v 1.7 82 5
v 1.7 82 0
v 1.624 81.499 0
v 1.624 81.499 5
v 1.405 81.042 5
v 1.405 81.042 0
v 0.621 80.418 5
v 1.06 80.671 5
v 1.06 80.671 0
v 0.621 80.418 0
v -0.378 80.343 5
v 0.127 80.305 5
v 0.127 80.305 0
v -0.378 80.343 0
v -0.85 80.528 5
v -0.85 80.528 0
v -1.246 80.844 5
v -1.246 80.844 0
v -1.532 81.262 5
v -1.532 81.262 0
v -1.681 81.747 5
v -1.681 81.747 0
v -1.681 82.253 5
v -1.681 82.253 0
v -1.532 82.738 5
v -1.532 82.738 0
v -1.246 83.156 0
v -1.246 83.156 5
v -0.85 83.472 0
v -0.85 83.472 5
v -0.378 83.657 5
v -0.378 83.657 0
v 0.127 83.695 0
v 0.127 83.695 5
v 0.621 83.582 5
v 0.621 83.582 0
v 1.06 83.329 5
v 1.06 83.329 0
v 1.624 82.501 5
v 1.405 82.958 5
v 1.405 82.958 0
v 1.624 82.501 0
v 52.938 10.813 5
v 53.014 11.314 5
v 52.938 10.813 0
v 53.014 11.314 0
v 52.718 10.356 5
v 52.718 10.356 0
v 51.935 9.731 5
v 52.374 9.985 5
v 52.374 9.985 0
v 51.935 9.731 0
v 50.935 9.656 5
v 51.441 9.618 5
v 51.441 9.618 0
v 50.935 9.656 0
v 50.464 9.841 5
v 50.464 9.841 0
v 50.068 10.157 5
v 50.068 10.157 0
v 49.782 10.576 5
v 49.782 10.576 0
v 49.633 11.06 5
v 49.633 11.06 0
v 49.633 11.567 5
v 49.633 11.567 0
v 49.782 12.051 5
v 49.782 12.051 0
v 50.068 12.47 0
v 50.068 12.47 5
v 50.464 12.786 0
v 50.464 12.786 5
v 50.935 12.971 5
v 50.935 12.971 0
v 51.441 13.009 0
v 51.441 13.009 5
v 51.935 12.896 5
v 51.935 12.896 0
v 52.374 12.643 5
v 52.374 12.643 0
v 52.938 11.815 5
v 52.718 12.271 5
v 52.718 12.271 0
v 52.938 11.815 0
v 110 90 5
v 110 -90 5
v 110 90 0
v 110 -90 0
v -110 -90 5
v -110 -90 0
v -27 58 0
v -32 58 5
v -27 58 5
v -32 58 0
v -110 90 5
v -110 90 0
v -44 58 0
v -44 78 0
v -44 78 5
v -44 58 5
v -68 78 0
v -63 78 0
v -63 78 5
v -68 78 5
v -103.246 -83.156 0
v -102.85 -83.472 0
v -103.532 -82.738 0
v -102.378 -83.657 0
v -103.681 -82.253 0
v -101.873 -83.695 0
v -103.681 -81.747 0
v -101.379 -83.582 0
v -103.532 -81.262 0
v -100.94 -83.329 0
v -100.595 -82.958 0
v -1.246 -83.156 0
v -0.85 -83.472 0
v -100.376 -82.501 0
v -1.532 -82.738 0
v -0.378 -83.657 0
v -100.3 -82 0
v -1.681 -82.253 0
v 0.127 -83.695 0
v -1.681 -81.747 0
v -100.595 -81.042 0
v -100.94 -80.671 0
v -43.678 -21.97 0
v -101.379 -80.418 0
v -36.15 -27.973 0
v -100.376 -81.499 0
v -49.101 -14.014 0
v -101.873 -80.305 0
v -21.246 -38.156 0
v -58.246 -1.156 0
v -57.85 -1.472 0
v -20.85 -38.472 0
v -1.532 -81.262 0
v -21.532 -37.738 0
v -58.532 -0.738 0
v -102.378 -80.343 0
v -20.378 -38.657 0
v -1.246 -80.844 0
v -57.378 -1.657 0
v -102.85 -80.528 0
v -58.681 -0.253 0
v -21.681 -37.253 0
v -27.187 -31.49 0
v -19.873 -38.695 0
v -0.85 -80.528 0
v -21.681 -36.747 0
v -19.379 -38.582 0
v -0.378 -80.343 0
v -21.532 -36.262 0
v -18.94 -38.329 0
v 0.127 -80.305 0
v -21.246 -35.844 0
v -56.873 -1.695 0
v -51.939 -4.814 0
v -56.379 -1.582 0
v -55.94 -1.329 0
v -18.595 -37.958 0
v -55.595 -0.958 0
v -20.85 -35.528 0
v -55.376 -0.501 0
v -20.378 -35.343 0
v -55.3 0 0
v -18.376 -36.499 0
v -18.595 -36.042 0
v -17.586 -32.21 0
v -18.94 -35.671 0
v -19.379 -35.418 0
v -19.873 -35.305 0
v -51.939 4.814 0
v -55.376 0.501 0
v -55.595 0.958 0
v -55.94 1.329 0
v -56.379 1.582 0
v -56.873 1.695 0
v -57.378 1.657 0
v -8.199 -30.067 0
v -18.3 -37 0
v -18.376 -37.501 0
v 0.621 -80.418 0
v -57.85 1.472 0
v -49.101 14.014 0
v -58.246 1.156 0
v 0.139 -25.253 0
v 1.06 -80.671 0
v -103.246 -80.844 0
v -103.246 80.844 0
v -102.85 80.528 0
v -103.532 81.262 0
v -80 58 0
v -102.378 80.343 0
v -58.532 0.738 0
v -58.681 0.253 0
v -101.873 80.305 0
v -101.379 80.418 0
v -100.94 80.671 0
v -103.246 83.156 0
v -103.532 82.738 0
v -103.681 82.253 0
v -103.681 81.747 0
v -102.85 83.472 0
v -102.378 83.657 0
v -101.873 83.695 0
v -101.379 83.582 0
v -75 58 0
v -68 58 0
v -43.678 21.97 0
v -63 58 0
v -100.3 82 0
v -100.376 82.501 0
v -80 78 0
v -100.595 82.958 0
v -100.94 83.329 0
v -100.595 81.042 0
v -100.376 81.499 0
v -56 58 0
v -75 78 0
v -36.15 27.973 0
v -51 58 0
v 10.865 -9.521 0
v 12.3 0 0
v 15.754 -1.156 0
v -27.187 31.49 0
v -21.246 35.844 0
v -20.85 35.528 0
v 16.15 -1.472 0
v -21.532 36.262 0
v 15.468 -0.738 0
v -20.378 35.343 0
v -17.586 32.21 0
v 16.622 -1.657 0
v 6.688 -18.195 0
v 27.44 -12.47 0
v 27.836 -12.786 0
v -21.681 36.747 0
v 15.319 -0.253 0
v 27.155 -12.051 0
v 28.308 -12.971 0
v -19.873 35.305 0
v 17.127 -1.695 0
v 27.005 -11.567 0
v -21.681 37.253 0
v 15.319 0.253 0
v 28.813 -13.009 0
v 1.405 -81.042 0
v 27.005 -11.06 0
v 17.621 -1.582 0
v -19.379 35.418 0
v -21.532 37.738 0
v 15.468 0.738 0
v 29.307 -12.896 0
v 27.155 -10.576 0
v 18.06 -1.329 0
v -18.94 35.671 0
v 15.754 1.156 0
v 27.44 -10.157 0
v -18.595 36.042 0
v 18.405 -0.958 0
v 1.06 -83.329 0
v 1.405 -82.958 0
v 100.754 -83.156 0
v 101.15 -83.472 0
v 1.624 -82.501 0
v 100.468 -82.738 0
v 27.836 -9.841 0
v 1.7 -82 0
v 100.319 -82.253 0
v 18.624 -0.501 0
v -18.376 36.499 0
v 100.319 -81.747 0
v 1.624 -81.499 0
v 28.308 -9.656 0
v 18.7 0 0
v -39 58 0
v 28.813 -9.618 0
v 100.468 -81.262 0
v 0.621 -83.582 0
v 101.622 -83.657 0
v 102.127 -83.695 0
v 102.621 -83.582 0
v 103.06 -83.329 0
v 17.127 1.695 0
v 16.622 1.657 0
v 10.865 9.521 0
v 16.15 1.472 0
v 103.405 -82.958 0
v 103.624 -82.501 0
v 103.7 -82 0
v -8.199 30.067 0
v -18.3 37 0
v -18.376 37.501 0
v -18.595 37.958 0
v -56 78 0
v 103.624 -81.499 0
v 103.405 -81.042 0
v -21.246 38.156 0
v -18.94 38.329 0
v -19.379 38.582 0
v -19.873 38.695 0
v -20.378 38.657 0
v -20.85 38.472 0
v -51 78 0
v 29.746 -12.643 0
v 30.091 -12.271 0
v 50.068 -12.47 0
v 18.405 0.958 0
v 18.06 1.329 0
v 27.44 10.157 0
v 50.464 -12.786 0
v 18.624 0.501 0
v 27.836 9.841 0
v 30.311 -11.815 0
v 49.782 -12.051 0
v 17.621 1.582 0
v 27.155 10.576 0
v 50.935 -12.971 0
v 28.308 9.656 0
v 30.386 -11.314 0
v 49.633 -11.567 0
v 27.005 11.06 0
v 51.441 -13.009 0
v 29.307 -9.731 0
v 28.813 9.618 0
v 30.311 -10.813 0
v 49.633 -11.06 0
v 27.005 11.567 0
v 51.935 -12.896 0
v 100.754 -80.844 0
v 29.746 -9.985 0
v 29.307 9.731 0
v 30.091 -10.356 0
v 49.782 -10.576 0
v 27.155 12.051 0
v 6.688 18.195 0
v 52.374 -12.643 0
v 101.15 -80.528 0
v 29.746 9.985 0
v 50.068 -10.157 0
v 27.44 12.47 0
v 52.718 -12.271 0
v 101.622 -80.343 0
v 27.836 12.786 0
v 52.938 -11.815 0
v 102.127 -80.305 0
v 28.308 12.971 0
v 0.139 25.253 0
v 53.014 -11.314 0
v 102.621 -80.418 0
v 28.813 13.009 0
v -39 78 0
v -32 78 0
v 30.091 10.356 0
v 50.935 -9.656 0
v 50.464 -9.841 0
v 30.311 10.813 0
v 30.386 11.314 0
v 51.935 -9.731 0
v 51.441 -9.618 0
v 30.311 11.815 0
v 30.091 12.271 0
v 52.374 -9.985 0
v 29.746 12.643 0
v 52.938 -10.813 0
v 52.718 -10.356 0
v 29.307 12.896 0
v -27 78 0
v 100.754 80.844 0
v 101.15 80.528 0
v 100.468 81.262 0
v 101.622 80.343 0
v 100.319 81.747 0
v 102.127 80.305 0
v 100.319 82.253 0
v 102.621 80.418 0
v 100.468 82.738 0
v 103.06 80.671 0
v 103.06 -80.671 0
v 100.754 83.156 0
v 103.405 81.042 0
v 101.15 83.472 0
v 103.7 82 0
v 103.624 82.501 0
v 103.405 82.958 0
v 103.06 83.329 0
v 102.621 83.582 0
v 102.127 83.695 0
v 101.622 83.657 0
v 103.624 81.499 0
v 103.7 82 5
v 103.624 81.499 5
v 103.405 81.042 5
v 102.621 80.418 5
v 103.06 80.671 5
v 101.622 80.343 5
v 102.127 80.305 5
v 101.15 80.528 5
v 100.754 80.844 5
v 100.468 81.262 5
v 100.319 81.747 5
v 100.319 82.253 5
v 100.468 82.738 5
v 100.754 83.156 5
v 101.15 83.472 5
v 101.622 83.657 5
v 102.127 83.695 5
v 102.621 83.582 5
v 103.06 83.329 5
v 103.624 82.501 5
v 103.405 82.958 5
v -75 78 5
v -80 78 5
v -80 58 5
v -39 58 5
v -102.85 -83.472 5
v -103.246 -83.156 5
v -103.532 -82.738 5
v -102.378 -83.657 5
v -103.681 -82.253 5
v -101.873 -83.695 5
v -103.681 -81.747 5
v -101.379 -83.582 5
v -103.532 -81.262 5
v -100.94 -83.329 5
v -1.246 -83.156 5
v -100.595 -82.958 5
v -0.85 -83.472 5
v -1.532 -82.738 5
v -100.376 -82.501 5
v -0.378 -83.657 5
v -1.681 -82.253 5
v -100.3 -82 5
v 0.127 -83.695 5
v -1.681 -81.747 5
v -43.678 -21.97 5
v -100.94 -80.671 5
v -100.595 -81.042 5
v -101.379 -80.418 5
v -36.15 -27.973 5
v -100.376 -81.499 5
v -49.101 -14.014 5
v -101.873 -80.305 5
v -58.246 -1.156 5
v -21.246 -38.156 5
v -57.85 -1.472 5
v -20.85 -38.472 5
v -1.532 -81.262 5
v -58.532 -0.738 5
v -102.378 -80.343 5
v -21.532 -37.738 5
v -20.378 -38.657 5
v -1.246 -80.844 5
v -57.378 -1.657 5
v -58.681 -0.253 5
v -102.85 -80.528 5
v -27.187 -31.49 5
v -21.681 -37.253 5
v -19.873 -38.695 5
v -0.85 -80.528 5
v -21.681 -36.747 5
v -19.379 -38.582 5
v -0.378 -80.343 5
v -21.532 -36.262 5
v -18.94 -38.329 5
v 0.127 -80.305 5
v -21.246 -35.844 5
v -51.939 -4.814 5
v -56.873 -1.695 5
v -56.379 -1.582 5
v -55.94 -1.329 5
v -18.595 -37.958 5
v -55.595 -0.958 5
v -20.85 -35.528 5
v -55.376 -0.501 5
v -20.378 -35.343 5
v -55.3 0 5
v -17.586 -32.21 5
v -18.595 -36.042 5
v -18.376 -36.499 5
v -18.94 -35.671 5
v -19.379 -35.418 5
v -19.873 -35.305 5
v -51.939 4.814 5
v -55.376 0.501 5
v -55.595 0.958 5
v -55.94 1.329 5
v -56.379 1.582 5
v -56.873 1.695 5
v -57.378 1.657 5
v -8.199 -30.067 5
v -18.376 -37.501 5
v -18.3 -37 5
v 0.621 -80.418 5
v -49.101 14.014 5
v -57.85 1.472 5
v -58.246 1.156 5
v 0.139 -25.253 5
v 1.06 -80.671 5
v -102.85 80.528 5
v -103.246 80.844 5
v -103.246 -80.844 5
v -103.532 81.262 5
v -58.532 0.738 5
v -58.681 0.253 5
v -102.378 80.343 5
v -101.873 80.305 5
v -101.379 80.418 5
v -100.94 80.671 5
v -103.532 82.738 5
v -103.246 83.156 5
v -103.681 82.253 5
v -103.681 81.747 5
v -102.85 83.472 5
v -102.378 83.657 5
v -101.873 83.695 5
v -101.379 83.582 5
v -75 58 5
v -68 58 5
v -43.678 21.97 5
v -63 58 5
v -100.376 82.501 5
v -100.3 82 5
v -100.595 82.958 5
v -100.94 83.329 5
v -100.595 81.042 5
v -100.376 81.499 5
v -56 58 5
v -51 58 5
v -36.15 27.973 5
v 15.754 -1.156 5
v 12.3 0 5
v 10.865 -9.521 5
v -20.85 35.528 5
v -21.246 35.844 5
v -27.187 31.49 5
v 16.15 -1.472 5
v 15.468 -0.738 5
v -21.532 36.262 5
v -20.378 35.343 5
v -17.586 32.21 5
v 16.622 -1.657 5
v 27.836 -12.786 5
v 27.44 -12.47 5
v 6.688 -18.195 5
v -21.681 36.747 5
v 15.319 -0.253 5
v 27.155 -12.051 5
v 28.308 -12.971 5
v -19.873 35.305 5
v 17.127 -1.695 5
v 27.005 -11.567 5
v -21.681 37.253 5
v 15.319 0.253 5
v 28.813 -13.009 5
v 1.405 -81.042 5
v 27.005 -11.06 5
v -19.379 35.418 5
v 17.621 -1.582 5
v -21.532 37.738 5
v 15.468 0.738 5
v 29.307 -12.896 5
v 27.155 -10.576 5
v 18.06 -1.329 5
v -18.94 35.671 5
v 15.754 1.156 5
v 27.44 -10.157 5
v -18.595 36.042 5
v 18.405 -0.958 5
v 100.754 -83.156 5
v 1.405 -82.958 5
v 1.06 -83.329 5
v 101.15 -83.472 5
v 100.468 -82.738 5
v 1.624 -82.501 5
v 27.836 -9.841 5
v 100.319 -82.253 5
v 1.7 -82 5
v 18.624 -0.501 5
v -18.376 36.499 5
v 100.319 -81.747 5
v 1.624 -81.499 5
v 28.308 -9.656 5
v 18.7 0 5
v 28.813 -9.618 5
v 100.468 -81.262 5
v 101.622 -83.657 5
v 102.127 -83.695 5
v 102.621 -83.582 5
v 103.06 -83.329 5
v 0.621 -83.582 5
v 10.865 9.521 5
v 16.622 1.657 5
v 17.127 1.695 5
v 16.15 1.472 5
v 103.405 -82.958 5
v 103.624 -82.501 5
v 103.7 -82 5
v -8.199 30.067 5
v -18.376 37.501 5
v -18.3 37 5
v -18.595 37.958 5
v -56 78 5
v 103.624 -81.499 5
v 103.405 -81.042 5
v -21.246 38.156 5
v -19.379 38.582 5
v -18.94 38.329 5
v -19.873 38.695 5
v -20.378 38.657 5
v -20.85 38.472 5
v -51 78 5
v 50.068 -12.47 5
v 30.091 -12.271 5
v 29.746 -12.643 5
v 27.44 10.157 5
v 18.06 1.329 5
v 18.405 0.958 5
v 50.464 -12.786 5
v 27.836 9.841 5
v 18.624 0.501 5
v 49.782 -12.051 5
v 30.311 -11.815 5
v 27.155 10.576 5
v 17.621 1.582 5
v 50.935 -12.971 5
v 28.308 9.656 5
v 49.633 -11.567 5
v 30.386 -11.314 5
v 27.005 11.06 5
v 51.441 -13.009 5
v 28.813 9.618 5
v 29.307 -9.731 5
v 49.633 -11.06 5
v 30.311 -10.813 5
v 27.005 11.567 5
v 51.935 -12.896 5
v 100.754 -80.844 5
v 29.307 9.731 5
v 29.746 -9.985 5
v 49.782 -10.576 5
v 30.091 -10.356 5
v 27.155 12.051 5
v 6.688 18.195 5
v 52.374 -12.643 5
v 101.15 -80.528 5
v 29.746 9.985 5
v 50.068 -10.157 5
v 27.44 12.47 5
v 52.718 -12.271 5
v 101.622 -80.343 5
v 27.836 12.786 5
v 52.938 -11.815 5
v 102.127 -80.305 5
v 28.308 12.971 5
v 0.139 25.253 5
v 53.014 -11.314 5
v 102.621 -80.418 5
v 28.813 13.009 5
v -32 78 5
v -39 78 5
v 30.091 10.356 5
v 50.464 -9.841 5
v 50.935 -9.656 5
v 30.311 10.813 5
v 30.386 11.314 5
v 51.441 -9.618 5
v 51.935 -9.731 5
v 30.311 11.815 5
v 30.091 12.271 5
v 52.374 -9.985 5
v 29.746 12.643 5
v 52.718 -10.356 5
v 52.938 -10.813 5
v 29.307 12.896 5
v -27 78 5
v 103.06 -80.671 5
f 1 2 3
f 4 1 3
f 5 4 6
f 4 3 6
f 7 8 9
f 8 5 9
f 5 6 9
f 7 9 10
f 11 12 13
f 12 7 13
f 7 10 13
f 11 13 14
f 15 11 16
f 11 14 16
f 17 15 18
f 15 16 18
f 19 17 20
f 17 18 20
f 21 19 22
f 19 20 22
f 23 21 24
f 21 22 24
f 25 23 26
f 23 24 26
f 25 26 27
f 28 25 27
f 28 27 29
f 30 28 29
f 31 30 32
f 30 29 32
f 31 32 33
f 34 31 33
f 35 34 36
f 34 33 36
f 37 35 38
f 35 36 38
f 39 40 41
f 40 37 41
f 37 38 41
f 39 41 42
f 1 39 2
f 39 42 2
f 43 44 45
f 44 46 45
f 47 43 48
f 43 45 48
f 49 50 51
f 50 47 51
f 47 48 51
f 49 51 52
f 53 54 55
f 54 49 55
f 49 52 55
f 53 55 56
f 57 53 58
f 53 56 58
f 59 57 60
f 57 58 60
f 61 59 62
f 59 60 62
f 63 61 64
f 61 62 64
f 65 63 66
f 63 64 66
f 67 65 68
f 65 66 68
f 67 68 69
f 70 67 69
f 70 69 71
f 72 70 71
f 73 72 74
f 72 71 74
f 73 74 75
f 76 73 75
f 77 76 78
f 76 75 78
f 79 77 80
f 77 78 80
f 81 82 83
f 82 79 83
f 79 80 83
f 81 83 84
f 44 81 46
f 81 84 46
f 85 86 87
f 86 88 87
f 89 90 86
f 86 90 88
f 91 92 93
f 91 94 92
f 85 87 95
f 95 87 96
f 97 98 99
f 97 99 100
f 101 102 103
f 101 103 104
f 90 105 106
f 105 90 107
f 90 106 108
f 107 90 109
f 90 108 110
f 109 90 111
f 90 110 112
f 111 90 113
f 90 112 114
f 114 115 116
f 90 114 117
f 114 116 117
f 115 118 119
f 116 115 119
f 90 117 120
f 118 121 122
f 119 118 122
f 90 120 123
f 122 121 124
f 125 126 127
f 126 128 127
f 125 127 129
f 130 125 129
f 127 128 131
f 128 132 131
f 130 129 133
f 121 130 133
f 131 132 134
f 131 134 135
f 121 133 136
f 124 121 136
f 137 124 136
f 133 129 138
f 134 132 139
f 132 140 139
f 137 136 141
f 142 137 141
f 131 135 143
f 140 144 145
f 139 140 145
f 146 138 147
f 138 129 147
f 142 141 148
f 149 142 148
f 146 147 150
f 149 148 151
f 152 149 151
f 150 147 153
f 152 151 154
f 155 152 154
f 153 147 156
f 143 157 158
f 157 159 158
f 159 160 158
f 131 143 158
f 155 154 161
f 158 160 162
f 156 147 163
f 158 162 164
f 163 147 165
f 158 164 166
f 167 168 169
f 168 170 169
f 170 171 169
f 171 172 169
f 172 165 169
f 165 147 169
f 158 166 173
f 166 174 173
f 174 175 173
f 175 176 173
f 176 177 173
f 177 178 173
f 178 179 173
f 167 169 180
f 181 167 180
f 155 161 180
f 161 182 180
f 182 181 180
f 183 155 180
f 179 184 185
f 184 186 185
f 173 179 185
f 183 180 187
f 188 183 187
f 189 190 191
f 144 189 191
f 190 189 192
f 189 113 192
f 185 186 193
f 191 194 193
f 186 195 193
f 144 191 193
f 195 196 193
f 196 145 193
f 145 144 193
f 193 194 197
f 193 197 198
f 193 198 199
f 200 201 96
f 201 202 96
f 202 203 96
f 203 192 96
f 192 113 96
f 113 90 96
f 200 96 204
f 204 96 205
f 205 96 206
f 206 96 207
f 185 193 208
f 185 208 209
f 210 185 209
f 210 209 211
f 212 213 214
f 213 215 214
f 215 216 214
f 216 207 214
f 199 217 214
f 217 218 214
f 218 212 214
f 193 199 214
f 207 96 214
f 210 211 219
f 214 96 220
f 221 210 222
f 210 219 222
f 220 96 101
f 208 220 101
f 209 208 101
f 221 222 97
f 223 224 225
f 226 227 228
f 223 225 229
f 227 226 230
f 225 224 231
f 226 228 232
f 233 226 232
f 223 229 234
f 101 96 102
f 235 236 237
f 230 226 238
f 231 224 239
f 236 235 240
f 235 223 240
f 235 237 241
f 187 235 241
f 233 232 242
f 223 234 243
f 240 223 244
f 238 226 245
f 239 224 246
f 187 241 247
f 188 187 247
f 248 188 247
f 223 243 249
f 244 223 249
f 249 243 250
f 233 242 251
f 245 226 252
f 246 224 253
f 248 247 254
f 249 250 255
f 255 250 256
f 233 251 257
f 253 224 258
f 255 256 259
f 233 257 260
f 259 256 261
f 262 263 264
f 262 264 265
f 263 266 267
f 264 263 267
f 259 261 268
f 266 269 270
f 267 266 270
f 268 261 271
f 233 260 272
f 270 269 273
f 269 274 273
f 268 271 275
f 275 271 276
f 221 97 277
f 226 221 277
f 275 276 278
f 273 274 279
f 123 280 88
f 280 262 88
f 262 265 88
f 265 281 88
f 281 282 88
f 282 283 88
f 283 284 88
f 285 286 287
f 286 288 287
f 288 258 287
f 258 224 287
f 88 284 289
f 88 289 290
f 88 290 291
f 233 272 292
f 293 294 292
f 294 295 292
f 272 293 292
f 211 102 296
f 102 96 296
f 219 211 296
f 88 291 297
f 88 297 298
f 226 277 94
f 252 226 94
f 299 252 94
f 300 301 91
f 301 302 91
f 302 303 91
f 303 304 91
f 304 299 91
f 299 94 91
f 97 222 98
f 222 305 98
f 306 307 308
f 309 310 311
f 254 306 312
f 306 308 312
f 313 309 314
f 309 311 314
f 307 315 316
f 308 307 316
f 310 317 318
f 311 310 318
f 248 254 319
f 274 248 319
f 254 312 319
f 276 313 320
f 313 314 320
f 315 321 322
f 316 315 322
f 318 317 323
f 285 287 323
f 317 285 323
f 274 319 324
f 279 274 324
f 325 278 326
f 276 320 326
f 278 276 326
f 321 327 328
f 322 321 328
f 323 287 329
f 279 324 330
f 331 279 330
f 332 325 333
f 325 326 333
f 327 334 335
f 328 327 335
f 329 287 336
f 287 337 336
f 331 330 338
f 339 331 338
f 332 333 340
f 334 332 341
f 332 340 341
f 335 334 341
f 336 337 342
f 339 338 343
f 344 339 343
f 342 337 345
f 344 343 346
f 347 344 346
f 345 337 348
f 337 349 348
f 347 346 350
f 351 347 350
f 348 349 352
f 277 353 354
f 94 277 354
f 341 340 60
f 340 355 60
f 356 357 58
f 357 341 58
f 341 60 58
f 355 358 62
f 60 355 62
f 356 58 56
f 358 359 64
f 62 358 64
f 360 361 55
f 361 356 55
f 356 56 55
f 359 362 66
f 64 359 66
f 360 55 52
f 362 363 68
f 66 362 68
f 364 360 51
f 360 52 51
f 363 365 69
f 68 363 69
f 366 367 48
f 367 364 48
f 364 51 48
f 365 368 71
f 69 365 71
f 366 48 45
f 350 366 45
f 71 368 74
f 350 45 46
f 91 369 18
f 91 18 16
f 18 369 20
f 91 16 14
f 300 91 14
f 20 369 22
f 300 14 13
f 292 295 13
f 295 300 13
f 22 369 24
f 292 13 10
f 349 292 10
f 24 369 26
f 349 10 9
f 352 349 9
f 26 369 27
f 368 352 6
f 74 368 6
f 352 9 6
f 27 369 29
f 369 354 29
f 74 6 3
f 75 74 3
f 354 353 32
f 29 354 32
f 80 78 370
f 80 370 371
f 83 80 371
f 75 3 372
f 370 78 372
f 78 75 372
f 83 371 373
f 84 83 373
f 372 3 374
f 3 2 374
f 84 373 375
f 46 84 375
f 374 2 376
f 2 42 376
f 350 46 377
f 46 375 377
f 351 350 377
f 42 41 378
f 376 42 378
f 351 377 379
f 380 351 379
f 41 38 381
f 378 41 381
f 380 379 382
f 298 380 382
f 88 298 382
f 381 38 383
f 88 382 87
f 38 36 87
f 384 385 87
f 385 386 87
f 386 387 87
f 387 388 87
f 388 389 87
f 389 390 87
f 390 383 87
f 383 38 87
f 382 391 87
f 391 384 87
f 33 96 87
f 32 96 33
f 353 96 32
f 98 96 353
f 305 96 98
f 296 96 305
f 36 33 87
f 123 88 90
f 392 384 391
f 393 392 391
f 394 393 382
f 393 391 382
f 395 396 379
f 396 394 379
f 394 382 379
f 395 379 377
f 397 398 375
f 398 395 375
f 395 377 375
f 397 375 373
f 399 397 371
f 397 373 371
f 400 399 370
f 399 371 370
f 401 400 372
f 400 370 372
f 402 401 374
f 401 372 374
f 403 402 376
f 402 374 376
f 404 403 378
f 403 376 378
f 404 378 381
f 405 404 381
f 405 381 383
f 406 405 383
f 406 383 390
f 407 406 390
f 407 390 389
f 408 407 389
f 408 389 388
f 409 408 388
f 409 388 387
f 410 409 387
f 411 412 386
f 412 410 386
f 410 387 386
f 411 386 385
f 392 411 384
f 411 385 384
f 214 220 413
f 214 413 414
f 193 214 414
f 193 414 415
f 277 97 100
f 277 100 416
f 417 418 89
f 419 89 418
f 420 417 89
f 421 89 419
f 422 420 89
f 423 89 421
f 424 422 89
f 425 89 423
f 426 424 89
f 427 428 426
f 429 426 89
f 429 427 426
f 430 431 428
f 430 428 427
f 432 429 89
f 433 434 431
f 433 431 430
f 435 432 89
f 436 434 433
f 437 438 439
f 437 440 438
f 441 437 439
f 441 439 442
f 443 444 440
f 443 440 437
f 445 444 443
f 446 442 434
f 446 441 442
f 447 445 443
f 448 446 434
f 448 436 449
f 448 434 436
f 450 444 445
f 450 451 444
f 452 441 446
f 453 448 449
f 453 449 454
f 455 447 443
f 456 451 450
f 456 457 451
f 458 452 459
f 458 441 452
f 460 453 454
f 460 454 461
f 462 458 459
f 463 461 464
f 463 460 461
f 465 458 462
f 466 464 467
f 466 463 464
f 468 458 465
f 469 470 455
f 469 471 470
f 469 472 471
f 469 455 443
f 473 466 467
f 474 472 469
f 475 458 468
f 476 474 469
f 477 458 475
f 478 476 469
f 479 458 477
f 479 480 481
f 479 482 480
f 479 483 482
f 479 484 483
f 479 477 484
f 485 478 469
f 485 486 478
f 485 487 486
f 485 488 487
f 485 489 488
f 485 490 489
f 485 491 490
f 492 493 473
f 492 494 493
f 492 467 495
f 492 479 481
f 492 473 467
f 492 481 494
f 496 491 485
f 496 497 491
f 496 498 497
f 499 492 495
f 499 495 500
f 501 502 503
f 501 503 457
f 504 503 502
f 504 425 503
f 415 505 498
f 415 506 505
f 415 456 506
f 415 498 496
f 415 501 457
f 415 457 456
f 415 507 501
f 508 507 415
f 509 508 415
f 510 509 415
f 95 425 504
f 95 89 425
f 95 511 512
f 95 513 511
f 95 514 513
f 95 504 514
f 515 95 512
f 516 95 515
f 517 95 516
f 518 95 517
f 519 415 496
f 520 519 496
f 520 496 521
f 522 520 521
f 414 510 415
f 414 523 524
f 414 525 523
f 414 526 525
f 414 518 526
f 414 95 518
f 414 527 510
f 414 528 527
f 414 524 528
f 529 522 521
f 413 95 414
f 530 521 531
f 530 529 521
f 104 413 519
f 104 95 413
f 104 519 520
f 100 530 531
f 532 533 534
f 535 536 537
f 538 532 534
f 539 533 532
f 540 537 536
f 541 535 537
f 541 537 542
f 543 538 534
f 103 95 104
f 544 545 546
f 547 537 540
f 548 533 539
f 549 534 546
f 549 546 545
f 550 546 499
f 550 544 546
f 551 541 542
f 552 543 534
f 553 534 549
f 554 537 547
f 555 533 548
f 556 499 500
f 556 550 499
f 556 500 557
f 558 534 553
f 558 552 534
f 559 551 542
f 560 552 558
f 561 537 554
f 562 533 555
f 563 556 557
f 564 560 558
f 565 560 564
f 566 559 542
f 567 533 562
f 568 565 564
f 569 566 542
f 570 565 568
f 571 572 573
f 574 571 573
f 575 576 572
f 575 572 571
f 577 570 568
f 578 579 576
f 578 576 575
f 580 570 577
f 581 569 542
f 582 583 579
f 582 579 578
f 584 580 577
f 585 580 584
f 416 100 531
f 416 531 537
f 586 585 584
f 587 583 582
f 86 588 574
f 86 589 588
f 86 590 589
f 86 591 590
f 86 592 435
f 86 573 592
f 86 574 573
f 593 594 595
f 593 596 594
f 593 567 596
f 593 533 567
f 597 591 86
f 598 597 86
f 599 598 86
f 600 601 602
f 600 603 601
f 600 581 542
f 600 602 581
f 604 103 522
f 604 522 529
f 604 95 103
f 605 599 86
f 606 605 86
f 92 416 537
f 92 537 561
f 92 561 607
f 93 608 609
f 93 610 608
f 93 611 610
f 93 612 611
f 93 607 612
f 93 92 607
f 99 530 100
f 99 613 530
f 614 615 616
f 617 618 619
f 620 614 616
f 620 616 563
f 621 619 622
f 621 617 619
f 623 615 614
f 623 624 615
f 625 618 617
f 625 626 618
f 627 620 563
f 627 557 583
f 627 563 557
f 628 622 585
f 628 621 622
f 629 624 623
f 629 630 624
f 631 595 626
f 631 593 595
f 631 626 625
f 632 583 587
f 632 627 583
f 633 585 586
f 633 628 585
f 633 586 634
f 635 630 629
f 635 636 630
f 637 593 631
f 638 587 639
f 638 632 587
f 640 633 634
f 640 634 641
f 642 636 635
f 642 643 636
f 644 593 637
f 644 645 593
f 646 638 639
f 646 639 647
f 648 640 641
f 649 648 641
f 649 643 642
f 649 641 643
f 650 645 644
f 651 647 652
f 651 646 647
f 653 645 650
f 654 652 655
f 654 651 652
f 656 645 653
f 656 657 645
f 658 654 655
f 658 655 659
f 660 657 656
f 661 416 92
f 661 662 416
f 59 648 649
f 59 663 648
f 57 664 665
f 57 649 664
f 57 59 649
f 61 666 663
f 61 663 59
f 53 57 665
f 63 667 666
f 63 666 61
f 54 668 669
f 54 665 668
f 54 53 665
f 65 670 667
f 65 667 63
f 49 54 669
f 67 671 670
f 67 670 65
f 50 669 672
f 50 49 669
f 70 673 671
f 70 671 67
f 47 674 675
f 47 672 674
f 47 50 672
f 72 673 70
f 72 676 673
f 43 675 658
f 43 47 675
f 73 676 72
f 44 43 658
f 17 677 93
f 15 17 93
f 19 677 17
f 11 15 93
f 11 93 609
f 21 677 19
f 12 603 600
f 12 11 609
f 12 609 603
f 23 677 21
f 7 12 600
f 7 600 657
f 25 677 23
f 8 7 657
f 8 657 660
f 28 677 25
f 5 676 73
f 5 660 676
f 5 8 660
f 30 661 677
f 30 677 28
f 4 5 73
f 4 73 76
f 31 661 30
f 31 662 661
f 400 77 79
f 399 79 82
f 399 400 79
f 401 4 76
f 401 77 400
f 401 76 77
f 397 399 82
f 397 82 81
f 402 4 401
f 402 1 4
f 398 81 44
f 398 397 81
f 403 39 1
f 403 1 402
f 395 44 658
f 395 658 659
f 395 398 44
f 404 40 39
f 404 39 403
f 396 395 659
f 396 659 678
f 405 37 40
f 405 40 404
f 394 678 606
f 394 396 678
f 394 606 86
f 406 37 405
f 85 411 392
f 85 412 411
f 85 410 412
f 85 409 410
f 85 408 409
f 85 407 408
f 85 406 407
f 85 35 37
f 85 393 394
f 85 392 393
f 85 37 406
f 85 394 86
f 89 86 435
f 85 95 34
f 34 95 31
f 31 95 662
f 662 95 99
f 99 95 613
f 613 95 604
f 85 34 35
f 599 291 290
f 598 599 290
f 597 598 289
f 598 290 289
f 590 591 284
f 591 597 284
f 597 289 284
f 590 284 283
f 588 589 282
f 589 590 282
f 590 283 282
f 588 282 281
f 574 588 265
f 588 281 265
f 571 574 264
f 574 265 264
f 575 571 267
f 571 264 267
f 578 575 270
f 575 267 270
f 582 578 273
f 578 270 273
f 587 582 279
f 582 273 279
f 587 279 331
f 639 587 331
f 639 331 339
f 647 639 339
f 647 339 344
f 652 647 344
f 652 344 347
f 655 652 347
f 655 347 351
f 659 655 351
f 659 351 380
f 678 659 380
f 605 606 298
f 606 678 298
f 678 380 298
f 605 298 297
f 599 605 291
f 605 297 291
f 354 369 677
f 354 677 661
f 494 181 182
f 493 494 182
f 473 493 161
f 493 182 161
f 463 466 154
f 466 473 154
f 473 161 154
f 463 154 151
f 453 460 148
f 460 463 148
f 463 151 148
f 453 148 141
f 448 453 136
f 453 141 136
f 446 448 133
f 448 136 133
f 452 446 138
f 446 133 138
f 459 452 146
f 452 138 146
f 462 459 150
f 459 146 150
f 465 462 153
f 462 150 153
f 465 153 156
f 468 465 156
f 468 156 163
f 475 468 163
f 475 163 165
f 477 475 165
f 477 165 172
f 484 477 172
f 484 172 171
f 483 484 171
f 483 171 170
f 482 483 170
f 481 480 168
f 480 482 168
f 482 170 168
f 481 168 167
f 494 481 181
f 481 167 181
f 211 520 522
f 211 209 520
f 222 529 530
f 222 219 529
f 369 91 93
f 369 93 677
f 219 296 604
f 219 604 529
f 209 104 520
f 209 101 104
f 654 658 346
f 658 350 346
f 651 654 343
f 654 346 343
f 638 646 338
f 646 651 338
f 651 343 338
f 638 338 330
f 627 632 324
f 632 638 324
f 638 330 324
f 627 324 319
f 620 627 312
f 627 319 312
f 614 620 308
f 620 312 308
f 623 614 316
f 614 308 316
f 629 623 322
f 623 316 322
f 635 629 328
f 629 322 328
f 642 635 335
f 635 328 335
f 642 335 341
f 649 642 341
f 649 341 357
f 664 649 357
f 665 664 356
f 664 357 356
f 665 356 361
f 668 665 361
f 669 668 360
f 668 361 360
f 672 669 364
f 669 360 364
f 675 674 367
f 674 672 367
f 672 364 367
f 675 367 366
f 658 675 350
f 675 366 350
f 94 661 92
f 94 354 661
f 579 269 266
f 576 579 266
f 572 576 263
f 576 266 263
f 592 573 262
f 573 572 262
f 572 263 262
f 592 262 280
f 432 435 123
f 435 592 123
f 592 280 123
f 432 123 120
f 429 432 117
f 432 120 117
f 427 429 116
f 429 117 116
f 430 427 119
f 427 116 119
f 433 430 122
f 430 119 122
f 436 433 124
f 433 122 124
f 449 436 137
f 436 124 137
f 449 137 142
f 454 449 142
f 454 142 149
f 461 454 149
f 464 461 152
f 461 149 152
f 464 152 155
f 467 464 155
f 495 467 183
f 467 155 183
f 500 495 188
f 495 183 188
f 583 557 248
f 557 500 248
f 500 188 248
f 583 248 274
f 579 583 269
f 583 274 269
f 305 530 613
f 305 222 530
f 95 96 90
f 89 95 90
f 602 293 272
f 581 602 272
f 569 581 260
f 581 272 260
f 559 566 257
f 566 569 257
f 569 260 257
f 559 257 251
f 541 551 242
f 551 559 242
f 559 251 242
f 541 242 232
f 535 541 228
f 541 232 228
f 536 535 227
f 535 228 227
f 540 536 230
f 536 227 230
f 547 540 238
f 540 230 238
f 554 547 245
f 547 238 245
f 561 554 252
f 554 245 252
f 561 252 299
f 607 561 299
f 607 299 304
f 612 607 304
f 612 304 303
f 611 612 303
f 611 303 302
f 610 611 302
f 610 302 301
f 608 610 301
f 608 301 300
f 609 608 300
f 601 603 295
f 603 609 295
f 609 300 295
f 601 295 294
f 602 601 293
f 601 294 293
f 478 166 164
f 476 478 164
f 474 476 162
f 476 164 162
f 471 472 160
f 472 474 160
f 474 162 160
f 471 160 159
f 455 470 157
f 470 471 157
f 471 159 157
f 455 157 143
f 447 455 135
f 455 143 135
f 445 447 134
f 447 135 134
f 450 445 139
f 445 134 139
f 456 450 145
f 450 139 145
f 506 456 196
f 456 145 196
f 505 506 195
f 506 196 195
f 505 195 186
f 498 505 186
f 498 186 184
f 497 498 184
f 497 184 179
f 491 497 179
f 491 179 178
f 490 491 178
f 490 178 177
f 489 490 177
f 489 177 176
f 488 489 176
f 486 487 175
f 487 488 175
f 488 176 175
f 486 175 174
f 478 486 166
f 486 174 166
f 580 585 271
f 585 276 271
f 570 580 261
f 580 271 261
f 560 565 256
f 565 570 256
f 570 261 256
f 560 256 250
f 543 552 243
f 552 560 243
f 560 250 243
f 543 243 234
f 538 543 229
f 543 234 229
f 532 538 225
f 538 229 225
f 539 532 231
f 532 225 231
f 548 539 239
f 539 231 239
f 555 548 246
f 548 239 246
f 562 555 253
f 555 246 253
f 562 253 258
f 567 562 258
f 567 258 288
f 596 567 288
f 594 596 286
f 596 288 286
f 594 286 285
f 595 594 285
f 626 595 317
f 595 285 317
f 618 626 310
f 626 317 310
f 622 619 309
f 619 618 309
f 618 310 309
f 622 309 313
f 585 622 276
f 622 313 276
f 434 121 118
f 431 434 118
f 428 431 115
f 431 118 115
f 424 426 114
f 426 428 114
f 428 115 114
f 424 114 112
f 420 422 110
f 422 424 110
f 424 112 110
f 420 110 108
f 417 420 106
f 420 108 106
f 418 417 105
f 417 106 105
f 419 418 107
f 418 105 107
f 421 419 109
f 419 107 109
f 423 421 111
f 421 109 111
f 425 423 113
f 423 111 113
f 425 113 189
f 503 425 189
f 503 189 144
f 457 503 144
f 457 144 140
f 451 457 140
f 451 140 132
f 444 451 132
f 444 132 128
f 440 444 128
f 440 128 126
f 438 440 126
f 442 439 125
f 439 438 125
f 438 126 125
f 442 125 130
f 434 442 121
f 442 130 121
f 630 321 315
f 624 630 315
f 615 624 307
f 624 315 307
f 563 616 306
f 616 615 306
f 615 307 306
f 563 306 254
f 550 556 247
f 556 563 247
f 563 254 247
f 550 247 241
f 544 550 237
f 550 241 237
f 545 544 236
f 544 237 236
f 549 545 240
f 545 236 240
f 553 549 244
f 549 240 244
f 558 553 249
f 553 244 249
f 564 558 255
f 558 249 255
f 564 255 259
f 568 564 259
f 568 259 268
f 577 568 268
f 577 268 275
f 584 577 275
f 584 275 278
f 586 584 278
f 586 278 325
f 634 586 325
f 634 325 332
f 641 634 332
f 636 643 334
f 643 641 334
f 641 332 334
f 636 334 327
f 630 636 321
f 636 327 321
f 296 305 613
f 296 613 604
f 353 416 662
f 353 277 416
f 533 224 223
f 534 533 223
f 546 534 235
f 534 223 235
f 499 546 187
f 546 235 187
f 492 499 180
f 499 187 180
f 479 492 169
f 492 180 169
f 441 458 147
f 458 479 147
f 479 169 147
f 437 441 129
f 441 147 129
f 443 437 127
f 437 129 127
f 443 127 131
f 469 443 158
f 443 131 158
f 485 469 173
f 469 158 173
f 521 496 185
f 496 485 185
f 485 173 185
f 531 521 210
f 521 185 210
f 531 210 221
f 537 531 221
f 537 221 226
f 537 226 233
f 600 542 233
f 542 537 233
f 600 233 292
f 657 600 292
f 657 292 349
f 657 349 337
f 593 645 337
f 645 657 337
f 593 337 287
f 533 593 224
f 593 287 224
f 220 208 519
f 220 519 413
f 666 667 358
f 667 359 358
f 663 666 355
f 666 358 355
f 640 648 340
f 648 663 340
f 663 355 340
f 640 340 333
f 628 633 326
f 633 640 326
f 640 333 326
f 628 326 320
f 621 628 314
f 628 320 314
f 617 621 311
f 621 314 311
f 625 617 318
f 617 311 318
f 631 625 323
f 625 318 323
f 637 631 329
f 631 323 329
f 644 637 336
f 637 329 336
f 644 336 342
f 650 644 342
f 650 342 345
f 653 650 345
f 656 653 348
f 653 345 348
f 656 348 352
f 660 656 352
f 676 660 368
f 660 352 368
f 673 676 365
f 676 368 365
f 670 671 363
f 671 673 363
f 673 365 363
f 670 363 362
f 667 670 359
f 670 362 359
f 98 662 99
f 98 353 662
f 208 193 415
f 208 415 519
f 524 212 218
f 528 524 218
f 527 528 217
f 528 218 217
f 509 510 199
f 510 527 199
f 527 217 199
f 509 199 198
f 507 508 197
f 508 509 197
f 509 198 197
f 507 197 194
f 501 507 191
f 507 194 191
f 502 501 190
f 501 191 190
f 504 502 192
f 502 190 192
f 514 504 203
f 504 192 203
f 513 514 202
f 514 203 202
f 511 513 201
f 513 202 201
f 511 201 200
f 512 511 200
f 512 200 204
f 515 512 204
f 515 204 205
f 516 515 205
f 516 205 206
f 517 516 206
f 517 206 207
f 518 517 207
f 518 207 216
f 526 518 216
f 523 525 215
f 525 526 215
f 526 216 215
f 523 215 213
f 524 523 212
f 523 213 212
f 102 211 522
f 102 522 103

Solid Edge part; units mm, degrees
sketch "Sketch1" plane through (0, 0, 0) normal (0, 0, 1) x (1, 0, 0)
  line L0 (-110, -90) -> (110, -90)
  line L1 (110, -90) -> (110, 90)
  line L2 (110, 90) -> (-110, 90)
  line L3 (-110, 90) -> (-110, -90)
  circle A0 centre (-20, 0) radius 32.3
  circle A1 centre (-102, -82) radius 1.7
  circle A2 centre (-102, 82) radius 1.7
  circle A3 centre (102, -82) radius 1.7
  circle A4 centre (102, 82) radius 1.7
  circle A5 centre (0, -82) radius 1.7
  circle A6 centre (0, 82) radius 1.7
  circle A7 centre (17, 0) radius 1.7
  circle A8 centre (-57, 0) radius 1.7
  circle A9 centre (-20, 37) radius 1.7
  circle A10 centre (-20, -37) radius 1.7
  circle A11 centre (51.3137, 11.3137) radius 1.7
  circle A12 centre (28.6863, 11.3137) radius 1.7
  circle A13 centre (28.6863, -11.3137) radius 1.7
  circle A14 centre (51.3137, -11.3137) radius 1.7
  line L4 (-80, 58) -> (-75, 58)
  line L5 (-75, 58) -> (-75, 78)
  line L6 (-75, 78) -> (-80, 78)
  line L7 (-80, 78) -> (-80, 58)
  line L8 (-68, 58) -> (-63, 58)
  line L9 (-63, 58) -> (-63, 78)
  line L10 (-63, 78) -> (-68, 78)
  line L11 (-68, 78) -> (-68, 58)
  line L12 (-56, 58) -> (-51, 58)
  line L13 (-51, 58) -> (-51, 78)
  line L14 (-51, 78) -> (-56, 78)
  line L15 (-56, 78) -> (-56, 58)
  line L16 (-44, 58) -> (-39, 58)
  line L17 (-39, 58) -> (-39, 78)
  line L18 (-39, 78) -> (-44, 78)
  line L19 (-44, 78) -> (-44, 58)
  line L20 (-32, 58) -> (-27, 58)
  line L21 (-27, 58) -> (-27, 78)
  line L22 (-27, 78) -> (-32, 78)
  line L23 (-32, 78) -> (-32, 58)
extrude "Protrusion1" add sketch "Sketch1" along normal blind 5
